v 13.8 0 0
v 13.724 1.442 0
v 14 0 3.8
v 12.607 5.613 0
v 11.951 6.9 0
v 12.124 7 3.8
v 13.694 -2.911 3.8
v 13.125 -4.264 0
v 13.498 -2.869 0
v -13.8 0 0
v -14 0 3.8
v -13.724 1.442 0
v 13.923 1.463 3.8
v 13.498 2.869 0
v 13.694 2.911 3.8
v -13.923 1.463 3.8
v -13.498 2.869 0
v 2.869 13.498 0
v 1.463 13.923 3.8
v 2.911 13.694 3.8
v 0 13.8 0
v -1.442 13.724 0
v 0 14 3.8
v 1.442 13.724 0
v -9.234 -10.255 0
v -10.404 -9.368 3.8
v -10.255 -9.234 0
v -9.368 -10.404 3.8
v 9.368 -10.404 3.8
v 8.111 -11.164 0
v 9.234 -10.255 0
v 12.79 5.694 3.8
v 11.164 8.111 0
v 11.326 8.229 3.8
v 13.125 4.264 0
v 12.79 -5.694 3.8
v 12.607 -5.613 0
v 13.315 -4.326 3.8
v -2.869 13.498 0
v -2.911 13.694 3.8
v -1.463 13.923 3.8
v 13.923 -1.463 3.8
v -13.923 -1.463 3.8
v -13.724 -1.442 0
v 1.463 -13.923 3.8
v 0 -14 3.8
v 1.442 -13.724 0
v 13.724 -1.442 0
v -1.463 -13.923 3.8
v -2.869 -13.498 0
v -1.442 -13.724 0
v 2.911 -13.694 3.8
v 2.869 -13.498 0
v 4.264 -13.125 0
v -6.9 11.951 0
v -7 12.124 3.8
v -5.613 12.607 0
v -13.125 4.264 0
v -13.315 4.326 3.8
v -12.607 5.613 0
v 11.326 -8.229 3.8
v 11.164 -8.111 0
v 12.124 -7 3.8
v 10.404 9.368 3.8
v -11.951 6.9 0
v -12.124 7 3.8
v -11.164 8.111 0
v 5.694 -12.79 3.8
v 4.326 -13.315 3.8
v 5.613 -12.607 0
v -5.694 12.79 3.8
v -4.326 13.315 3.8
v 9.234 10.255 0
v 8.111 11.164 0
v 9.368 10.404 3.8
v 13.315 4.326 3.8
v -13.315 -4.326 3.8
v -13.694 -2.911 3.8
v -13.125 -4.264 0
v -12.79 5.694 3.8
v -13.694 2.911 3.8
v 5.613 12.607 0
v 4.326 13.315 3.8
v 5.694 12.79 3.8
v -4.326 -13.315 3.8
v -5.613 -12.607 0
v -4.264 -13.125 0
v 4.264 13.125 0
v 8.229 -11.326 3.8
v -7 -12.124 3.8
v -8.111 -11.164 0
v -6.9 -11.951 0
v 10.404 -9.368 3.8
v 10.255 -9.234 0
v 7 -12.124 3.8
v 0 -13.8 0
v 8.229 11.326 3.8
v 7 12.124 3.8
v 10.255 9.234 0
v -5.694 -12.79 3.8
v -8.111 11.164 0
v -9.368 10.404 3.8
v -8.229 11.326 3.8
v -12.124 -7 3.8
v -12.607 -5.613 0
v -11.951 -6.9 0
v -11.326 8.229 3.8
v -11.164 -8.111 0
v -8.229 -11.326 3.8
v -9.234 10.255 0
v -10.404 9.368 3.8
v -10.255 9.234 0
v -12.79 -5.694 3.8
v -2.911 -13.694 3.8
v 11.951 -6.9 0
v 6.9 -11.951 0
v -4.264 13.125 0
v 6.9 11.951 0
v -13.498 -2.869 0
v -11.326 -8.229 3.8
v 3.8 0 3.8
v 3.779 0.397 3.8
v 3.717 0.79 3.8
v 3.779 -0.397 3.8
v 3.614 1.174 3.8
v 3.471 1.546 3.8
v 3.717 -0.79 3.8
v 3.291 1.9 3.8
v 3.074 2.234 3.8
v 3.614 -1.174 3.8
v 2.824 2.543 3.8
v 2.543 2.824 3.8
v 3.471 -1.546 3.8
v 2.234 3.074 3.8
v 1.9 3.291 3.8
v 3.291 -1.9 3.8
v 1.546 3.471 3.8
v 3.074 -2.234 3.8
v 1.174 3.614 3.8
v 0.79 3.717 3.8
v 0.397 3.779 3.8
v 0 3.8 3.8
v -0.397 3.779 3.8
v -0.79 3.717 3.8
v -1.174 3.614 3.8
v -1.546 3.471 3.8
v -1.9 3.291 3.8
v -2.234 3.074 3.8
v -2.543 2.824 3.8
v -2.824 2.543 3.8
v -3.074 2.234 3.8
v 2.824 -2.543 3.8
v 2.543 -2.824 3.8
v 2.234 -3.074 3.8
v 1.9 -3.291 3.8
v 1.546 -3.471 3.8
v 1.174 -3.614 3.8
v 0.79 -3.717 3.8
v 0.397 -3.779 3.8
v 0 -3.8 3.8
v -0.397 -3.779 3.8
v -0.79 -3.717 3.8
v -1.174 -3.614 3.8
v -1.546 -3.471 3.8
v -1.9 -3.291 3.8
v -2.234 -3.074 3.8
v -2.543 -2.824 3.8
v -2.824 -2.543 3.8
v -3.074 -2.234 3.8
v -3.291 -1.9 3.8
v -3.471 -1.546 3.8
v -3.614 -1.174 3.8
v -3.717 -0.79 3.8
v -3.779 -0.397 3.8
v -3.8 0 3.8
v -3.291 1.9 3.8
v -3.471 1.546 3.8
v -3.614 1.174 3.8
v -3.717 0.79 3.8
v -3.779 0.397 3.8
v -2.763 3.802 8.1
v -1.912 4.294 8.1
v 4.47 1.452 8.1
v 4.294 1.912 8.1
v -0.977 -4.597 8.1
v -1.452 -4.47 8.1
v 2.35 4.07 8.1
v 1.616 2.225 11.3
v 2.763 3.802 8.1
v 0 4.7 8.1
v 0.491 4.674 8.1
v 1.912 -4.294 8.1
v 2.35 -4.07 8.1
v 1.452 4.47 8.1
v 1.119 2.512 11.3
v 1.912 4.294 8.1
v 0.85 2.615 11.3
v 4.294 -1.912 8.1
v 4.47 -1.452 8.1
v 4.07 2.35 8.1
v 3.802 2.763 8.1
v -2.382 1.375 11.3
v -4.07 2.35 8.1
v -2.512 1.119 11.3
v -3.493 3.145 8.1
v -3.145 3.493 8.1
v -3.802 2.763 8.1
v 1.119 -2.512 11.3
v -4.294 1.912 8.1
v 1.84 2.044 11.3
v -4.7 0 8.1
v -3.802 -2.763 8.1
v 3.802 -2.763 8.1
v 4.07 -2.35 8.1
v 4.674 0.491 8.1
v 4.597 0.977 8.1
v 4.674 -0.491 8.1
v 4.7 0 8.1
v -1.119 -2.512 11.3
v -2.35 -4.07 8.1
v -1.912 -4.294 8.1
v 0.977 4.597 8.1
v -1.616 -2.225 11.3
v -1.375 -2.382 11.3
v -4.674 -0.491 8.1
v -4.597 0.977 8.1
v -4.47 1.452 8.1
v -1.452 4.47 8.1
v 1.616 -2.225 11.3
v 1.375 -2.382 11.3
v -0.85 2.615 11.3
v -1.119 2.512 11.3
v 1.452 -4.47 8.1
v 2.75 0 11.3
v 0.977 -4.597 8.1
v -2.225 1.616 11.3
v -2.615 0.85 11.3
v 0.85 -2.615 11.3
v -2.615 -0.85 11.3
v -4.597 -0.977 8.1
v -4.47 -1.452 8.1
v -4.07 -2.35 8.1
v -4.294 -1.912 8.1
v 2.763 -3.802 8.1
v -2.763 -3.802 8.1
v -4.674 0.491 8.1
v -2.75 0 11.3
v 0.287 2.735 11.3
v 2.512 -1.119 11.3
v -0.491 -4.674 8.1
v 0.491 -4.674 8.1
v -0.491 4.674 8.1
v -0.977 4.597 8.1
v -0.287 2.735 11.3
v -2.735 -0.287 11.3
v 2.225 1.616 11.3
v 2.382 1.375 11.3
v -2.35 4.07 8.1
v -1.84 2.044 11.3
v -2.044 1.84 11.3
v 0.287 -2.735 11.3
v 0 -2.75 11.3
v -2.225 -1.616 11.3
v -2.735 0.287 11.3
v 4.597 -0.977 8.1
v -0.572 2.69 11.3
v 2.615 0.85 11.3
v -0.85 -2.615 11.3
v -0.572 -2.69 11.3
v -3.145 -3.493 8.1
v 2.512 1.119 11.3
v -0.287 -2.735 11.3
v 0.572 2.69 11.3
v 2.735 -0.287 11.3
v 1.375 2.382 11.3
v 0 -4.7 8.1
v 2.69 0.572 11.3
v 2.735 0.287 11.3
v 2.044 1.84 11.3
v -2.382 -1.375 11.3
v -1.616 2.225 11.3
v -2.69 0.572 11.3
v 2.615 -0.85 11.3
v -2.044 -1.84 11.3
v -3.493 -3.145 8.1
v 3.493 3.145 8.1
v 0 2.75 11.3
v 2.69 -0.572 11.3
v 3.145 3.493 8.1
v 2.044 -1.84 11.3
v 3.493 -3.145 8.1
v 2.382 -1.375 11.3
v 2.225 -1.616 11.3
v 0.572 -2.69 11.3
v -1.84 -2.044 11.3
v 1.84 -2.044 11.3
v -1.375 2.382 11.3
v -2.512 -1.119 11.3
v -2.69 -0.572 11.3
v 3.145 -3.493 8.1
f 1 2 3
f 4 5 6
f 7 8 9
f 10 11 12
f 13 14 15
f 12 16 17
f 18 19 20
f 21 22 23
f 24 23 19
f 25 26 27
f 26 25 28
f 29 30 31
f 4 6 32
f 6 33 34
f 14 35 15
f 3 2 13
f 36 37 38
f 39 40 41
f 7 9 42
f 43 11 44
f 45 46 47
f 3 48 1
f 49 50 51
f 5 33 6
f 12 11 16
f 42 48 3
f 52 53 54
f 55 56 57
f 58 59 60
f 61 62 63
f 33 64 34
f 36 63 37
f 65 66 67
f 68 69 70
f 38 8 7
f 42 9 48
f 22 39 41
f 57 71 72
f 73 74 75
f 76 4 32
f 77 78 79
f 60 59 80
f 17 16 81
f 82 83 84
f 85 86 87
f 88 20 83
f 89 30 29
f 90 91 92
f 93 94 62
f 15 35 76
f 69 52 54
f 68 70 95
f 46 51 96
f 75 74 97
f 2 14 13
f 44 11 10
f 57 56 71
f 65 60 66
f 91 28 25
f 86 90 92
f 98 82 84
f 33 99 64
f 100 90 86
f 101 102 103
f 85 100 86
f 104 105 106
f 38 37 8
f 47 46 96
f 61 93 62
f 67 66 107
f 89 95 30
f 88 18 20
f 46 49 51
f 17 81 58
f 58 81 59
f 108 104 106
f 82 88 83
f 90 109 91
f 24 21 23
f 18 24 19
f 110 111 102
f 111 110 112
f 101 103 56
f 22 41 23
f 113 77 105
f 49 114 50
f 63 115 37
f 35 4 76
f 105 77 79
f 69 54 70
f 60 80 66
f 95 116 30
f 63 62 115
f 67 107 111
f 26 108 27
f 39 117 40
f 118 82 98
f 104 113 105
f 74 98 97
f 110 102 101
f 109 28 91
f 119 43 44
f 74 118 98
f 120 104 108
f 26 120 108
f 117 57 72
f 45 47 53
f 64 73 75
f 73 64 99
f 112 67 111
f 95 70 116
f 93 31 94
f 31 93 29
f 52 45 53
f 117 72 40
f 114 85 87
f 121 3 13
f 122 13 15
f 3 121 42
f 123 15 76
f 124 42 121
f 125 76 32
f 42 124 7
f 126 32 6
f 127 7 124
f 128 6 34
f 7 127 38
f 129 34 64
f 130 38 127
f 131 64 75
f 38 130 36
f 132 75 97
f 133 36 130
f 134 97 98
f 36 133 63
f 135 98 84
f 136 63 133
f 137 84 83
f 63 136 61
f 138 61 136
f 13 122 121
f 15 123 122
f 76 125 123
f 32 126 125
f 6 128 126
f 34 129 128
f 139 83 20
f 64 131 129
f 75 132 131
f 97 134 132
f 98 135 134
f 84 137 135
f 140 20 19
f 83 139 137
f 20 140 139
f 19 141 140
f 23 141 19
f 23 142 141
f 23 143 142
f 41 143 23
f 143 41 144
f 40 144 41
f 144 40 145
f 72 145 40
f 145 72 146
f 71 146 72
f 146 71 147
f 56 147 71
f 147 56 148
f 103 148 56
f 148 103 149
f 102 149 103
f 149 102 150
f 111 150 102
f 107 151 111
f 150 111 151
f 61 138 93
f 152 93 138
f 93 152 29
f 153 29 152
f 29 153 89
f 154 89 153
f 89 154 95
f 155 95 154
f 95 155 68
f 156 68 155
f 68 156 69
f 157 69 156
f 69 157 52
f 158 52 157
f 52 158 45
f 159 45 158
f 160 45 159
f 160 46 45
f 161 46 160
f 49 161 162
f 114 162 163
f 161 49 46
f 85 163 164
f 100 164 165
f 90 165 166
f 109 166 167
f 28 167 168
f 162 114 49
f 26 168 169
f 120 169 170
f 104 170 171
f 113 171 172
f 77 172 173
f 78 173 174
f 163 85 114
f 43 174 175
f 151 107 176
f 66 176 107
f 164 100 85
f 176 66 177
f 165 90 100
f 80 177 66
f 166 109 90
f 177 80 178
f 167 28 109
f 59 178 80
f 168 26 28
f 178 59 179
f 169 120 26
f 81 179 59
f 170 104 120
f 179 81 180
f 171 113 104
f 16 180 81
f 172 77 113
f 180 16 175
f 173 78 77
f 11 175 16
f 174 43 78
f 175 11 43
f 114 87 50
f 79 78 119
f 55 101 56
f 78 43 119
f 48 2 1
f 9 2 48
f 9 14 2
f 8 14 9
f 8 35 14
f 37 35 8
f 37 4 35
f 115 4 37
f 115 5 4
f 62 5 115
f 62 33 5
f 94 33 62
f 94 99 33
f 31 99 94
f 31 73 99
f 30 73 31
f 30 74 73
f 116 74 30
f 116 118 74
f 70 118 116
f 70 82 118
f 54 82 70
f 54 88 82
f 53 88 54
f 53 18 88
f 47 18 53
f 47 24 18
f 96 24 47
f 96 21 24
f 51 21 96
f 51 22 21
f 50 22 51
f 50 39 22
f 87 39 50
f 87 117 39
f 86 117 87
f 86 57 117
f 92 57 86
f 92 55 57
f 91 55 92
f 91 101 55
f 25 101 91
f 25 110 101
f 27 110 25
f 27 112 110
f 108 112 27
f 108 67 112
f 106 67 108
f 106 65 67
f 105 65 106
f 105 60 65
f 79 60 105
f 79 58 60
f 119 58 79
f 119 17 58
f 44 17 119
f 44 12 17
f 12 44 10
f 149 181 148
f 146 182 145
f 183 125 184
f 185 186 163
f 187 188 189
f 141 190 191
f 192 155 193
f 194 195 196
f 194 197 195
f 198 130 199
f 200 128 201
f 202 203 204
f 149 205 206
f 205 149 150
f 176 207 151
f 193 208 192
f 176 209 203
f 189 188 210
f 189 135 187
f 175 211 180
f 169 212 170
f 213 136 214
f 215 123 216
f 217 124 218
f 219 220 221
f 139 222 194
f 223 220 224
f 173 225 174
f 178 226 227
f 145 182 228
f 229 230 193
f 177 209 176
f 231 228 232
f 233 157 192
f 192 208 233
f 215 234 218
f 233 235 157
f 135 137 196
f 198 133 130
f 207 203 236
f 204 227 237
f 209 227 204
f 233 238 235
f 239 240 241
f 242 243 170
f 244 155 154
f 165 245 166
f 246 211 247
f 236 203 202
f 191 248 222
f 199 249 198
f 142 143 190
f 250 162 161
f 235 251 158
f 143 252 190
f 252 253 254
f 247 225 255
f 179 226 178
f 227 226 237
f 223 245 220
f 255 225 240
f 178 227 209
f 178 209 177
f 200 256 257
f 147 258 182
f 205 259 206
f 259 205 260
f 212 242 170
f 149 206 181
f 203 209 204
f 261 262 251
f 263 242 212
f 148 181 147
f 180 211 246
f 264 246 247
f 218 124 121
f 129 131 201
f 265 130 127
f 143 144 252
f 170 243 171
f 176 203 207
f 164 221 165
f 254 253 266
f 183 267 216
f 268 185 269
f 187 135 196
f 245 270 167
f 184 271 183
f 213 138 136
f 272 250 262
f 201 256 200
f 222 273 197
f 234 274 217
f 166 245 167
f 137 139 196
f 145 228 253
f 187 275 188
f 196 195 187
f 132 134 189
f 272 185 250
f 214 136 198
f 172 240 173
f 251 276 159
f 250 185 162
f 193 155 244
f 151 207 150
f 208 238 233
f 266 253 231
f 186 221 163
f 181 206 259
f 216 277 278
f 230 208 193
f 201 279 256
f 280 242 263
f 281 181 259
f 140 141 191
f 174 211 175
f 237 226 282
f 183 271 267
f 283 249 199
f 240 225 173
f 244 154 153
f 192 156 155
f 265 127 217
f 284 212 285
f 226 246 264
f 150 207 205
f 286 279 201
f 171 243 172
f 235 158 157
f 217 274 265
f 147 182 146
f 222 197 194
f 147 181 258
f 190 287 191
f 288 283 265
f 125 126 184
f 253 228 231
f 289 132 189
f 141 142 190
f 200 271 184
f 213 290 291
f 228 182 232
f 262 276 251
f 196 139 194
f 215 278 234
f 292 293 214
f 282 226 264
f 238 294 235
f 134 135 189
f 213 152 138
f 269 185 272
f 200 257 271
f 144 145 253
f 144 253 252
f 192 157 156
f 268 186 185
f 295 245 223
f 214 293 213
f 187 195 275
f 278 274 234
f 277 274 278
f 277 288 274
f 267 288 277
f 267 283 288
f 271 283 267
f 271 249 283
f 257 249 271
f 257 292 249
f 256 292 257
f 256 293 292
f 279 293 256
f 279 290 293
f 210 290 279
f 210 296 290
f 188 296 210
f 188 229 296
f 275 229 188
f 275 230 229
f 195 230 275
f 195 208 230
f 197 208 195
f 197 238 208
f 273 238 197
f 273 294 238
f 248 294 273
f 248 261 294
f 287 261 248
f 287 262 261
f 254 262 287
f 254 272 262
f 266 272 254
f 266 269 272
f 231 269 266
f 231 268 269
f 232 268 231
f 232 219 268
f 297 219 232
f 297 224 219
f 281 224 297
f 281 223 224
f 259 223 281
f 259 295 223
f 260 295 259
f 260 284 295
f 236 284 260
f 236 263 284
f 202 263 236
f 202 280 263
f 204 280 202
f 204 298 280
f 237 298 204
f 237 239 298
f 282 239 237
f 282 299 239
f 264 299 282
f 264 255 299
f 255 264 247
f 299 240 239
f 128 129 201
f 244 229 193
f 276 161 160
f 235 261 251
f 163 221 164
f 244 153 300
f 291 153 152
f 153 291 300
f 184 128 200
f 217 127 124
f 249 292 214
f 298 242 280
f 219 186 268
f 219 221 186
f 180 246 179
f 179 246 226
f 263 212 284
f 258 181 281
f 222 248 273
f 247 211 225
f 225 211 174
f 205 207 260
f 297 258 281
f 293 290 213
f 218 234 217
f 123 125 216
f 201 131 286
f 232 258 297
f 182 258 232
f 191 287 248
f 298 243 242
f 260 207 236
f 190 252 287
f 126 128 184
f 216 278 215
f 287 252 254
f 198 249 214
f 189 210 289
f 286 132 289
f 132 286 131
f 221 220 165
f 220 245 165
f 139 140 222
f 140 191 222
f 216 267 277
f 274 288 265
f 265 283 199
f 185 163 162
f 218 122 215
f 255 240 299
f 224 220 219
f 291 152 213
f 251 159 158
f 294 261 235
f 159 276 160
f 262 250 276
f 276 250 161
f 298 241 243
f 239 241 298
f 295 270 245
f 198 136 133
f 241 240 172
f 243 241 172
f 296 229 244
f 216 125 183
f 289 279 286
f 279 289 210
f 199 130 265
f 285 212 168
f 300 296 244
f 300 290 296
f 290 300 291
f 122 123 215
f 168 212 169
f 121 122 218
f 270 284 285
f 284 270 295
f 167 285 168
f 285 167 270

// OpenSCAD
// Shower Rod Rubber End

face_lower_dia = 27.6; // Front face diameter
face_thick = 3.8;      // Face (rubber pad) thickness
face_upper_dia = 28.0; // Upper face diameter
rod_dia = 7.6;         // Rod diameter
rod_len = 4.3;         // Lip to rubber pad distance
lip_dia = 9.4;         // Lip diameter
lip_to_tip = 3.2;      // Tip length/lip-tip distance
tip_dia = 5.5;         // Tip diameter

$fn = 60;

module rubberPad() {
    cylinder(d1=face_lower_dia, d2=face_upper_dia, h=face_thick);
}

module rod() {
    translate([0, 0, face_thick])
    linear_extrude(rod_len)
    circle(d=rod_dia);
}

module lipAndTip() {
    translate([0, 0, face_thick + rod_len])
    cylinder(d1=lip_dia, d2=tip_dia, h=lip_to_tip);
}

support_len = 1.5;
module supportedLipAndTip() {
    hull() {
    lipAndTip();
    translate([0, 0, face_thick + rod_len - support_len])
    linear_extrude(0.01)
    circle(d=rod_len);
    }
}

union() {
rubberPad();
hull() {
rod();
supportedLipAndTip();
}
}
